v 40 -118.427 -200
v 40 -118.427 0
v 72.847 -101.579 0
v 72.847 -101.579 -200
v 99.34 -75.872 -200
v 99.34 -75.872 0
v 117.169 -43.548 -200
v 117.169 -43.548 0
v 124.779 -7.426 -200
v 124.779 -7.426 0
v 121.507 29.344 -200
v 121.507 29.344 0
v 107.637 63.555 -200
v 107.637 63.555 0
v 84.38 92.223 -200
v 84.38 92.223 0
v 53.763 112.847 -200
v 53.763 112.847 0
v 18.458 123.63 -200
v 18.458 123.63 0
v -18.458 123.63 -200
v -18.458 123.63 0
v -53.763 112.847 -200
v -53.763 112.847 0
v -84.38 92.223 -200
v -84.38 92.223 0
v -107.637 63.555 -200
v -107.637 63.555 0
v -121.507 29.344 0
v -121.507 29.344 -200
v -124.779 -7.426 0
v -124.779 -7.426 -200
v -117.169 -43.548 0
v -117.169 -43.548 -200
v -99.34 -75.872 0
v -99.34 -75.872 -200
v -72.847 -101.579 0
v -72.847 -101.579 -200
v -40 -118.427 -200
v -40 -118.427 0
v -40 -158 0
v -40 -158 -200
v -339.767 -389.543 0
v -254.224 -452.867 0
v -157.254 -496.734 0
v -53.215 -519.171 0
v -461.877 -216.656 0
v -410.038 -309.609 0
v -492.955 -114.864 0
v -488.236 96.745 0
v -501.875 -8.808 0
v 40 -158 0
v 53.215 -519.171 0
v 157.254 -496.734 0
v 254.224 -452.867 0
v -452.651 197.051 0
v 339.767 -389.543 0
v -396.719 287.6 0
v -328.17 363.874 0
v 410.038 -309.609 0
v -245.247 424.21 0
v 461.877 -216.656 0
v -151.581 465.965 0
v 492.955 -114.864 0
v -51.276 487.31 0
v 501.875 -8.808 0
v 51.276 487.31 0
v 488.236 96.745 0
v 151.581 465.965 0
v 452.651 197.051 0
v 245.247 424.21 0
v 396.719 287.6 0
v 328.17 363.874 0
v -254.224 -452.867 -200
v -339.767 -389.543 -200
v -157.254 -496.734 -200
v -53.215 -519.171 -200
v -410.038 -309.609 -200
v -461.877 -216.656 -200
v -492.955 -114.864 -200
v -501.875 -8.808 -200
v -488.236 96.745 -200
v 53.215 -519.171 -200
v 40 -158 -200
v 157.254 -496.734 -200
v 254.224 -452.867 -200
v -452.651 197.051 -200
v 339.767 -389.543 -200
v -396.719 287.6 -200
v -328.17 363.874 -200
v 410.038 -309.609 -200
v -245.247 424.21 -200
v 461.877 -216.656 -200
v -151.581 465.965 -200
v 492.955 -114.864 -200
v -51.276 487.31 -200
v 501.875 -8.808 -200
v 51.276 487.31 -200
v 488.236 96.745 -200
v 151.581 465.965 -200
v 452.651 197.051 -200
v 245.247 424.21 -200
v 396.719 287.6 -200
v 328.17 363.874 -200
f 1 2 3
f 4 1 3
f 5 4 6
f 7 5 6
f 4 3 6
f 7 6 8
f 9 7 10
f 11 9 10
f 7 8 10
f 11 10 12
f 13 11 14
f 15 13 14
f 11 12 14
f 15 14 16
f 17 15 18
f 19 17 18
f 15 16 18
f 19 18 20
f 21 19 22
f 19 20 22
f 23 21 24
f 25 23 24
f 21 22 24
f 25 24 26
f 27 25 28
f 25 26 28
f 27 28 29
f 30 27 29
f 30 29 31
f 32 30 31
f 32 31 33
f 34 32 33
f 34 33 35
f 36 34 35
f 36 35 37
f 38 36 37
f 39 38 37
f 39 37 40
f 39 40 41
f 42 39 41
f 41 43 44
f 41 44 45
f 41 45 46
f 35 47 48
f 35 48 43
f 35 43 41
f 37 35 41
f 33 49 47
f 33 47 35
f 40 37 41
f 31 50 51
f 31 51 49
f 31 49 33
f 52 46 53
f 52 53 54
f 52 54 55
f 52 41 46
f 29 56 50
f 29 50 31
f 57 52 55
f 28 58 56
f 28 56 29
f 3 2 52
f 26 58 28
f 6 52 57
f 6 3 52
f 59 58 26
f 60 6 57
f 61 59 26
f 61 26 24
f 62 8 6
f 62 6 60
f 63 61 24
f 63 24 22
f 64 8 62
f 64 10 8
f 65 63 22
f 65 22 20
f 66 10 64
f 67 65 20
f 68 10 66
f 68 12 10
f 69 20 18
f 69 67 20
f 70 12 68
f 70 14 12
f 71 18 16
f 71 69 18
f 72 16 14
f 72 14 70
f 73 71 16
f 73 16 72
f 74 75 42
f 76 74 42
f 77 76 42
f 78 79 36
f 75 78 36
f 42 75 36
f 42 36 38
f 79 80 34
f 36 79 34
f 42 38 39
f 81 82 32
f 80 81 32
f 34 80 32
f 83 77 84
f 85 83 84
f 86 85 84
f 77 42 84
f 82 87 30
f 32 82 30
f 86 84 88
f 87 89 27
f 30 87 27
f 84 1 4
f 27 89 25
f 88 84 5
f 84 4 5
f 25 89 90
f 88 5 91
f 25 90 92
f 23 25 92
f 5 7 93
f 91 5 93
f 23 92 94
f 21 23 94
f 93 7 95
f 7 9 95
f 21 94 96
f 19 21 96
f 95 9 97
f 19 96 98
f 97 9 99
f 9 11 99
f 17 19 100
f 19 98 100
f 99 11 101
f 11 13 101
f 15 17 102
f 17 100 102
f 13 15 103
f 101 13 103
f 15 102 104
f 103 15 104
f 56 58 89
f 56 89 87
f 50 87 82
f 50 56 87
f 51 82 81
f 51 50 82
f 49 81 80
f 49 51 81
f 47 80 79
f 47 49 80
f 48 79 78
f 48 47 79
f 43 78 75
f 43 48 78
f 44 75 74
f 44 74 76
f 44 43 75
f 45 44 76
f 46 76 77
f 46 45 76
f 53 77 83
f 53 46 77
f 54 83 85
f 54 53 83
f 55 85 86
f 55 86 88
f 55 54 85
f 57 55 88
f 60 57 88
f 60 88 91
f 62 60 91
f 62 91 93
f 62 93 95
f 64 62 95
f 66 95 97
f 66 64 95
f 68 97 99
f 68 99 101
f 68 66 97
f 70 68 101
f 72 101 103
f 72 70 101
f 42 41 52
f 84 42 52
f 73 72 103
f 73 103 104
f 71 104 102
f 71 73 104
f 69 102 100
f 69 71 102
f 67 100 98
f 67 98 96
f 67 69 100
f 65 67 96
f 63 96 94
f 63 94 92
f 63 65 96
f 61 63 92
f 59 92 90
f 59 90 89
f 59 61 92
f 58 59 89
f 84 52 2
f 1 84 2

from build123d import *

# Parameters (mm, degrees)
F1_DEPTH = 200
F3_DEPTH = 469.9


# Not quite as in the source:
# - a feature names something its author has since deleted; it is built from what else it names


with BuildPart() as f1:
    # F0 (on Top) → F1 (new body)
    with BuildSketch(Plane.XY):
        with BuildLine():
            ThreePointArc((-396.7193466419, 287.6), (-151.1746012819, -466.0968138995), (490, 0))
            ThreePointArc((490, 0), (466.0968138995, 151.1746012818), (396.7193466419, 287.6))
            ThreePointArc((396.7193466419, 287.6), (0, 482), (-396.7193466419, 287.6))
        make_face()
        with BuildLine():
            ThreePointArc((396.7193466419, 287.6), (466.0968138995, 151.1746012818), (490, 0))
            ThreePointArc((490, 0), (-151.1746012819, -466.0968138995), (-396.7193466419, 287.6))
            ThreePointArc((-396.7193466419, 287.6), (-162.5590477115, -494.9511090703), (502, -20))
            ThreePointArc((502, -20), (474.9511090703, 142.5590477115), (396.7193466419, 287.6))
        make_face()
        with BuildLine():
            ThreePointArc((-396.7193466419, 287.6), (0, 482), (396.7193466419, 287.6))
            ThreePointArc((396.7193466419, 287.6), (0, 490), (-396.7193466419, 287.6))
        make_face()
    extrude(amount=-F1_DEPTH)

    # F2 (on Top) → F3 (cut)
    with BuildSketch(Plane.XY):
        with BuildLine():
            ThreePointArc((40, -118.4271928233), (101.5504800579, -72.8868986856), (125, 0))
            ThreePointArc((125, 0), (-72.8868986856, 101.5504800579), (-40, -118.4271928233))
            Line((-40, -118.4271928233), (-40, 0))
            Line((-40, 0), (40, 0))
            Line((40, 0), (40, -118.4271928233))
        make_face()
        with BuildLine():
            Line((-40, 0), (-40, -118.4271928233))
            ThreePointArc((-40, -118.4271928233), (0, -125), (40, -118.4271928233))
            Line((40, -118.4271928233), (40, 0))
            Line((40, 0), (-40, 0))
        make_face()
        with BuildLine():
            ThreePointArc((40, -118.4271928233), (0, -125), (-40, -118.4271928233))
            Line((-40, -118.4271928233), (-40, -158))
            Line((-40, -158), (40, -158))
            Line((40, -158), (40, -118.4271928233))
        make_face()
    extrude(amount=-F3_DEPTH, mode=Mode.SUBTRACT)


solid = f1.part
